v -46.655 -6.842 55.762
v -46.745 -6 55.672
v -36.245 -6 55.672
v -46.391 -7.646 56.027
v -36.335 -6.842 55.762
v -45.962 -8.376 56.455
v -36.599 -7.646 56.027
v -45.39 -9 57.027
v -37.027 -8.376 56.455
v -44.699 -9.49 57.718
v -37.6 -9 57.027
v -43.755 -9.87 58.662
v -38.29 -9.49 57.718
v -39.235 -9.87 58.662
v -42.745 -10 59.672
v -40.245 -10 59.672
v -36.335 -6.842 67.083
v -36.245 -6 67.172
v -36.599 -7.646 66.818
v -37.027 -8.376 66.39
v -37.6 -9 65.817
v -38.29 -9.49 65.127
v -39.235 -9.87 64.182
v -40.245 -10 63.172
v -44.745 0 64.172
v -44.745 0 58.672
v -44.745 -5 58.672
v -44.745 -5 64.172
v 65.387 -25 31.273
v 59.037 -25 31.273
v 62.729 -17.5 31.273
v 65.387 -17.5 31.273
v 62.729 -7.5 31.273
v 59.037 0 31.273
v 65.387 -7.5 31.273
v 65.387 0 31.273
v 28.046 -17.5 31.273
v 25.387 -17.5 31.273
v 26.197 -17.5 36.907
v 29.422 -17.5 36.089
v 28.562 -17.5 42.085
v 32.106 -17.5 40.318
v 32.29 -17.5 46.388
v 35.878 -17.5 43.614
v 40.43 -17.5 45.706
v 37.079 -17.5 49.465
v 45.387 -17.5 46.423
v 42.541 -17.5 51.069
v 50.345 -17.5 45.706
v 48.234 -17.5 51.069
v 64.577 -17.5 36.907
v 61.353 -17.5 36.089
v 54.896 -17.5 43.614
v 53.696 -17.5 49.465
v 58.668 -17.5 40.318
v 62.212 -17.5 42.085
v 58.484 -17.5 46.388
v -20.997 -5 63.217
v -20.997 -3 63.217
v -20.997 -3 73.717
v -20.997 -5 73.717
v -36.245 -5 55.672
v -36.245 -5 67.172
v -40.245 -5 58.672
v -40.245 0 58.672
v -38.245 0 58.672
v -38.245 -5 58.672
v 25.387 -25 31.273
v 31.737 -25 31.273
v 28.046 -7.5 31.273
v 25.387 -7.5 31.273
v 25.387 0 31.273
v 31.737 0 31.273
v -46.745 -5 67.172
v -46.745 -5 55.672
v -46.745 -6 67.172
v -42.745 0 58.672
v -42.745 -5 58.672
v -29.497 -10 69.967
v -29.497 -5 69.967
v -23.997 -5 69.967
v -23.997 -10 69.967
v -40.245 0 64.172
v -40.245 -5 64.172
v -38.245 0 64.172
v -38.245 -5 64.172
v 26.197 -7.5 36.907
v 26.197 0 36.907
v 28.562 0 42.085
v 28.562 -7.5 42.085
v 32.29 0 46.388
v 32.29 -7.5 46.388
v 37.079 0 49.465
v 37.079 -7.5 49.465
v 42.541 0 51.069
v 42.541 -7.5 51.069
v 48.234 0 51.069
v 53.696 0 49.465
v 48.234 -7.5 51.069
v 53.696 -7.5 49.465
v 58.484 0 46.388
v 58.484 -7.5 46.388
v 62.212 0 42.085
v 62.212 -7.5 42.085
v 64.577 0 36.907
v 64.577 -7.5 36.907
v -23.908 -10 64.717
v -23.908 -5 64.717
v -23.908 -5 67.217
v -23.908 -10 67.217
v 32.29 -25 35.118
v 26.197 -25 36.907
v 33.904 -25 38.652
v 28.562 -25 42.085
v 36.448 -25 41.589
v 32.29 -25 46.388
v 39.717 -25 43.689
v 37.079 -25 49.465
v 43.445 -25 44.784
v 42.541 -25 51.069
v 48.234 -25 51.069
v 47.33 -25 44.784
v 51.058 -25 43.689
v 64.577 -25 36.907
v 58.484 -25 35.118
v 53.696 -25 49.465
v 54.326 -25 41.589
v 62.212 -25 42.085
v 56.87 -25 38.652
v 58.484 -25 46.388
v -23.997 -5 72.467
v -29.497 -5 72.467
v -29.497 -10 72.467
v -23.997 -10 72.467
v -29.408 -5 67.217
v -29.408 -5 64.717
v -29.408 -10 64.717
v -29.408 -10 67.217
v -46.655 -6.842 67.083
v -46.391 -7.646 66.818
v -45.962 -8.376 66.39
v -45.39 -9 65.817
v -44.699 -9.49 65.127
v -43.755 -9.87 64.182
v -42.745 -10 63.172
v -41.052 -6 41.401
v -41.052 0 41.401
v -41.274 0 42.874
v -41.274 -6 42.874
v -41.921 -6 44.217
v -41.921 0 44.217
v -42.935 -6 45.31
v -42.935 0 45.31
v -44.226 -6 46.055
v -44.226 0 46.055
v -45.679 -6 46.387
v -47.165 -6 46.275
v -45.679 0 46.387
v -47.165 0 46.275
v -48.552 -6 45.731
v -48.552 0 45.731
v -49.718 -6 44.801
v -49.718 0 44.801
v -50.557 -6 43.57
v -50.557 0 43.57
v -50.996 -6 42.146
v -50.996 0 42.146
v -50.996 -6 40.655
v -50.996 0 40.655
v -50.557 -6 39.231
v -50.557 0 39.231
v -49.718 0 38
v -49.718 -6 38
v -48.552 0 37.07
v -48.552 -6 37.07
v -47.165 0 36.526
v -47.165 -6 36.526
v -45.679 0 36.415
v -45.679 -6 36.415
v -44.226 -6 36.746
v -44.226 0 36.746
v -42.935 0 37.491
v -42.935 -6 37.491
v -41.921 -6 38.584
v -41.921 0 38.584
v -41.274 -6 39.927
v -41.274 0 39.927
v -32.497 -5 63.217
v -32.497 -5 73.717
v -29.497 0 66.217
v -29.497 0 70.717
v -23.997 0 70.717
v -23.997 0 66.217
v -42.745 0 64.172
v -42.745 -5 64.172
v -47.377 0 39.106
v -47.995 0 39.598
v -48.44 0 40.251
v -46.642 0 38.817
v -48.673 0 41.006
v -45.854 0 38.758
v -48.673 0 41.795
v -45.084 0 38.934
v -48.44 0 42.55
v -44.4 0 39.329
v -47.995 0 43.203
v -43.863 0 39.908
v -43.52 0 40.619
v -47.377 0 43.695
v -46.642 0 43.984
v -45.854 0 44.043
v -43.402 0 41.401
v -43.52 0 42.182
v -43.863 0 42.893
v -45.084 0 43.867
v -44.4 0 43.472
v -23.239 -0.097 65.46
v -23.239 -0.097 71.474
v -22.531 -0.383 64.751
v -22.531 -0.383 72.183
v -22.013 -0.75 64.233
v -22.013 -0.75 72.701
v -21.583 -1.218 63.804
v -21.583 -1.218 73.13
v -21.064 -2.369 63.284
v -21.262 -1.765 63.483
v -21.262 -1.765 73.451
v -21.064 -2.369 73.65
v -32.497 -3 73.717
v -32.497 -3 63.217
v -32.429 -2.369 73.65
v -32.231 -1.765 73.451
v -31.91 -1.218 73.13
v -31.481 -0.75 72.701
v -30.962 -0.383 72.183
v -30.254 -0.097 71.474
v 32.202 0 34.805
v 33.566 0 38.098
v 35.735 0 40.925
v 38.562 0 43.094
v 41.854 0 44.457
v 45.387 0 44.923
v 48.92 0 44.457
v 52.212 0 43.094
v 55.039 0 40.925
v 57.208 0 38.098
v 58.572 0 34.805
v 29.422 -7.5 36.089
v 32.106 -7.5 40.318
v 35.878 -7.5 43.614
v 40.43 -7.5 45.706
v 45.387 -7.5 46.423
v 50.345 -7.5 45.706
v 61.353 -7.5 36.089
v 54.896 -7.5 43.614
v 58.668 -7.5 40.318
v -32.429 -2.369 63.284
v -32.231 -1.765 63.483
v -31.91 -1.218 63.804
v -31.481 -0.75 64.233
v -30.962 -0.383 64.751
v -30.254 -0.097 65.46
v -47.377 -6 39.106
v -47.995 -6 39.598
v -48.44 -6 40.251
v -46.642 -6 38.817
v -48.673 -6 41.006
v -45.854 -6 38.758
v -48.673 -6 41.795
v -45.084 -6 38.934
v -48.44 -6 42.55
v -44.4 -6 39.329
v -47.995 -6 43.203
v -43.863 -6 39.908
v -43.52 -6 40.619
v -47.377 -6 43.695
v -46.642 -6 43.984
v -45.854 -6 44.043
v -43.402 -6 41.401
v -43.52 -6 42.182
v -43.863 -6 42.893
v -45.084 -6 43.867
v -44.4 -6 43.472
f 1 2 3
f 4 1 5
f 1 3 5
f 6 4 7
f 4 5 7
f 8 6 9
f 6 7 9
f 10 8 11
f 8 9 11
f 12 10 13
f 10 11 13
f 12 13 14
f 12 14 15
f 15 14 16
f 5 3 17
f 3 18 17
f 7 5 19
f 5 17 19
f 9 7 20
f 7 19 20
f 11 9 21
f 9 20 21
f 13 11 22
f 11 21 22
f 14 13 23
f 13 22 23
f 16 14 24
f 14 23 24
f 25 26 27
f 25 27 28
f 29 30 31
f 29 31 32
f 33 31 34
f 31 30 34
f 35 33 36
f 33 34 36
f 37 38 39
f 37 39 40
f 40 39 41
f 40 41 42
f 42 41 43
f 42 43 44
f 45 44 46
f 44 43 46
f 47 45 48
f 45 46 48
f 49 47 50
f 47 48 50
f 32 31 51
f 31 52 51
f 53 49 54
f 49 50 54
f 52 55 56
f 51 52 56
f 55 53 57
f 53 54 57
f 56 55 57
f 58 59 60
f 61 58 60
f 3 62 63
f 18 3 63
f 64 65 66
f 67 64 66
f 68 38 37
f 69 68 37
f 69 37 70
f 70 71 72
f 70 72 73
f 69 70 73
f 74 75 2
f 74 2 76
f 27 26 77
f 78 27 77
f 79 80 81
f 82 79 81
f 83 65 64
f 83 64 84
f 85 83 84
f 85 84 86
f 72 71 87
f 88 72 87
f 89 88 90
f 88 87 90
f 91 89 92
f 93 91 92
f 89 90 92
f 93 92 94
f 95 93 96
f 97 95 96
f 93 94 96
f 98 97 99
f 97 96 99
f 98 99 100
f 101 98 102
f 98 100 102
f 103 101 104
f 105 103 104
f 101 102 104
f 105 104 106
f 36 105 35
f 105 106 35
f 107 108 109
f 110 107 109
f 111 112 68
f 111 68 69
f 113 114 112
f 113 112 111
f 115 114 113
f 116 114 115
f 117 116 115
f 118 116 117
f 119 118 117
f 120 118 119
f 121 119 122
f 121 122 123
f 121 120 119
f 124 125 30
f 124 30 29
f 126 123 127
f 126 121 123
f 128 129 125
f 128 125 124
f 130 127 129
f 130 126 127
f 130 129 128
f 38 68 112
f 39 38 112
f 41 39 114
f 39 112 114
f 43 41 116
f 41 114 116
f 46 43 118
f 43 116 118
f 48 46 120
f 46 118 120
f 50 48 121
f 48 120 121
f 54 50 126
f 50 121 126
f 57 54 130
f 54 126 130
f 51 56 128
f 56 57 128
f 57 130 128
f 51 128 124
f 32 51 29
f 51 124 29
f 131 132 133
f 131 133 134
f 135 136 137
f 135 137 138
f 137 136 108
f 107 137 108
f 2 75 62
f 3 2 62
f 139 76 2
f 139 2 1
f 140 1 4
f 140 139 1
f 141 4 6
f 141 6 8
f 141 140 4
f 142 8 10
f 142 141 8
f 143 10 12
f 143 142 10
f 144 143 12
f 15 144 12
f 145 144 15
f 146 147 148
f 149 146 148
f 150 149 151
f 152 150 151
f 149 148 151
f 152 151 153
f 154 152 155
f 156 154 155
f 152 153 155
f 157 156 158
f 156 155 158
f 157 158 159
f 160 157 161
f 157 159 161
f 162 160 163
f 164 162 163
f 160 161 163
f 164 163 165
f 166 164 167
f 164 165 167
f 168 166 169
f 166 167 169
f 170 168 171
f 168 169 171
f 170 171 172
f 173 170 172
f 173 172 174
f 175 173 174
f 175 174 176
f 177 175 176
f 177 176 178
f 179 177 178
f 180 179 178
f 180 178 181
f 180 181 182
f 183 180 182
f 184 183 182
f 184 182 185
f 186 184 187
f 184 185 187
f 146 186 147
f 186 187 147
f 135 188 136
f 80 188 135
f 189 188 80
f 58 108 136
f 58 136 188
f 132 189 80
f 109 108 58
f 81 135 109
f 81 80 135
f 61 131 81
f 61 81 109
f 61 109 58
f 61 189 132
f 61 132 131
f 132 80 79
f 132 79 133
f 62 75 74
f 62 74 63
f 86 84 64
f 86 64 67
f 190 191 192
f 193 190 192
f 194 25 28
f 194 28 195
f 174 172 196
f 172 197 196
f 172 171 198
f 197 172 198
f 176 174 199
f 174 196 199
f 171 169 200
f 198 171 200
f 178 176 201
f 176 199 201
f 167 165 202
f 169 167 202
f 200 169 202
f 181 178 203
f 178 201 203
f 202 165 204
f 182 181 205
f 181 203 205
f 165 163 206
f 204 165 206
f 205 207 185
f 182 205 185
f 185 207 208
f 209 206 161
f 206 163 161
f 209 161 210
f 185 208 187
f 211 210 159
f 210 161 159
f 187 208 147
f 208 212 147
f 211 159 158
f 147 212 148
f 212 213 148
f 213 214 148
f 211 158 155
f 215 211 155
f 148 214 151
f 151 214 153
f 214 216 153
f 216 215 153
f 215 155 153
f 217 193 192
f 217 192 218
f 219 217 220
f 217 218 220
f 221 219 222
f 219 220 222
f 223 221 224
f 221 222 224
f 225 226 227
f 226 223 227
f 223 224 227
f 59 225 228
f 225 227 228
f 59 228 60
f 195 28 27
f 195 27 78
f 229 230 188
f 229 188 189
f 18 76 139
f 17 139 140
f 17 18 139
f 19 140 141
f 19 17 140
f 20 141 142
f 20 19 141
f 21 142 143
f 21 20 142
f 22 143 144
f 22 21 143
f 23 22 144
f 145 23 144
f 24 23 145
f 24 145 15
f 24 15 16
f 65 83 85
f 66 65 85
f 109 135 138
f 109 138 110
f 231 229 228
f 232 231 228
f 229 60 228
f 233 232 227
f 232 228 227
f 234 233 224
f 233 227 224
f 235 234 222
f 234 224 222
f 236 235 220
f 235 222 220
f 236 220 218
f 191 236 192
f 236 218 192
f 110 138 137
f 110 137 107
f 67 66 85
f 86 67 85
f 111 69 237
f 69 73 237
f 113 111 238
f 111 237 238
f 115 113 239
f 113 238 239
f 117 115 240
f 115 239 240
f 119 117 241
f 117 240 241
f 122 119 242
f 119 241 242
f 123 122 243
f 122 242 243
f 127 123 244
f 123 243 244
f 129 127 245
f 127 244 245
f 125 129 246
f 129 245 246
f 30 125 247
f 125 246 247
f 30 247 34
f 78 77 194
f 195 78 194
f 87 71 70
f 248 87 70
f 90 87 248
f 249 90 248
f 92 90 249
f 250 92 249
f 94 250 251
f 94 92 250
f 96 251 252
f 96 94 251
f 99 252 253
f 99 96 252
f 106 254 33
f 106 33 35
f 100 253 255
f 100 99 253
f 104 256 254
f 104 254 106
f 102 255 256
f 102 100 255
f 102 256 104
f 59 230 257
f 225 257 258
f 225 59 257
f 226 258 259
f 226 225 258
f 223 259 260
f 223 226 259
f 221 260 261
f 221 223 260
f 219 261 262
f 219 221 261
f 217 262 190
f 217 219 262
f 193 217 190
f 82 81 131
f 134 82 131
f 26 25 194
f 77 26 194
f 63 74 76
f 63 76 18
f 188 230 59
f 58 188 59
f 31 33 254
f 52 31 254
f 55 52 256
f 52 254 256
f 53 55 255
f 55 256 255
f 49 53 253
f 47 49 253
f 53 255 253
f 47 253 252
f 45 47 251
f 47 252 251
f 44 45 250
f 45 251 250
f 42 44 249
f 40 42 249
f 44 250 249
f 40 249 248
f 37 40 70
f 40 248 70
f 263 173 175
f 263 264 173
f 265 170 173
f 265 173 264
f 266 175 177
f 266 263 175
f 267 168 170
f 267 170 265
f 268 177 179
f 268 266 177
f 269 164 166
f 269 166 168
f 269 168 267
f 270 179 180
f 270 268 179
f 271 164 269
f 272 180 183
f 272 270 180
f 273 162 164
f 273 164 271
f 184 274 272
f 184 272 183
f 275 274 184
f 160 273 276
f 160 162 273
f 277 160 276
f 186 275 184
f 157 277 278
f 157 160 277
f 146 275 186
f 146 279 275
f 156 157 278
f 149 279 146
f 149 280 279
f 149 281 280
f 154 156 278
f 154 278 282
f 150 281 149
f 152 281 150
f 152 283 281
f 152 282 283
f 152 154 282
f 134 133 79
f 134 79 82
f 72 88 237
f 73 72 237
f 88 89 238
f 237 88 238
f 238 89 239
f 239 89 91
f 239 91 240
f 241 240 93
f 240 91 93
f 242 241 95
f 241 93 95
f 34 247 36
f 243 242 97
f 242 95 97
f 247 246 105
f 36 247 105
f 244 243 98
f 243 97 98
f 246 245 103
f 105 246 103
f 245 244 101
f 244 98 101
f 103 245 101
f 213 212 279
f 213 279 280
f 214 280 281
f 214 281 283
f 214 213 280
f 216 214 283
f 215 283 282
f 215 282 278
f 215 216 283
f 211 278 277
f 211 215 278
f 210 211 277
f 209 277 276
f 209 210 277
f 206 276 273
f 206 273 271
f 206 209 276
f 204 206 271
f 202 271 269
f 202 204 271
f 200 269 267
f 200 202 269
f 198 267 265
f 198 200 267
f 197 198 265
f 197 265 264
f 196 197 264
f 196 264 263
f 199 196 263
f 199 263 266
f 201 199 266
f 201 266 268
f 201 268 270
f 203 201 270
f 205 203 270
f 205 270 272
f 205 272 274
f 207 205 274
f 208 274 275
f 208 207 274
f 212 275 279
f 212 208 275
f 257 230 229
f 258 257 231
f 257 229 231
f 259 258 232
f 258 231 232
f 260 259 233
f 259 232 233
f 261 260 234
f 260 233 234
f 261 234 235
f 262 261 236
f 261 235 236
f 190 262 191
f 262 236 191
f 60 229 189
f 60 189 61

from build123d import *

# Parameters (mm, degrees)
F0_R      = 5
F0_R_2    = 2.65
F1_DEPTH  = 6
F2_W      = 2
F2_H      = 5.5
F3_DEPTH  = 5
F4_W      = 10.5
F4_H      = 11.5
F5_DEPTH  = 5
F6_R      = 4
F7_W      = 11.5
F7_H      = 10.5
F8_DEPTH  = 5
F9_W      = 5.5
F9_H      = 2.5
F10_DEPTH = 5
F11_R     = 3
F13_DEPTH = 7.5
F15_DEPTH = 10
F17_DEPTH = 7.5
F19_DEPTH = 25


with BuildPart() as f1:
    # F0 (on Front) → F1 (new body)
    with BuildSketch(Plane.XZ):
        with Locations((-46.0522696376, 41.4005257189)):
            Circle(F0_R)
        with Locations((-46.0522696376, 41.4005257189)):
            Circle(F0_R_2, mode=Mode.SUBTRACT)
    extrude(amount=F1_DEPTH)


with BuildPart() as f3:
    # F2 (on Front) → F3 (new body)
    with BuildSketch(Plane.XZ):
        with Locations((-39.2449274361, 61.4222493172)):
            Rectangle(F2_W, F2_H)
    extrude(amount=F3_DEPTH)


with BuildPart() as f3b:
    # F2 (on Front) → F3, piece 2 (new body)
    with BuildSketch(Plane.XZ):
        with Locations((-43.7449274361, 61.4222493172)):
            Rectangle(F2_W, F2_H)
    extrude(amount=F3_DEPTH)


with BuildPart() as f5:
    # F4 (on face) → F5 (new body)
    with BuildSketch(Plane.XZ.offset(5)):
        with Locations((-41.4949274361, 61.4222493172)):
            Rectangle(F4_W, F4_H)
    extrude(amount=F5_DEPTH)

    # F6
    f6_edges = [f5.edges().sort_by_distance(p)[0] for p in [
        (-41.494927, -10, 67.172249),
        (-46.744927, -10, 61.422249),
        (-41.494927, -10, 55.672249),
        (-36.244927, -10, 61.422249),
    ]]
    fillet(f6_edges, radius=F6_R)


with BuildPart() as f8:
    # F7 (on Front) → F8 (new body)
    with BuildSketch(Plane.XZ):
        with Locations((-26.7465799004, 68.466984272)):
            Rectangle(F7_W, F7_H)
    extrude(amount=F8_DEPTH)

    # F9 (on face) → F10 (join)
    with BuildSketch(Plane.XZ.offset(5)):
        with Locations((-26.7465799004, 71.216984272)):
            Rectangle(F9_W, F9_H)
        with Locations((-26.6575082093, 65.966984272)):
            Rectangle(F9_W, F9_H)
    extrude(amount=F10_DEPTH)

    # F11
    f11_edges = [f8.edges().sort_by_distance(p)[0] for p in [
        (-26.74658, 0, 73.716984),
        (-32.49658, 0, 68.466984),
        (-26.74658, 0, 63.216984),
        (-20.99658, 0, 68.466984),
    ]]
    fillet(f11_edges, radius=F11_R)


with BuildPart() as f13:
    # F12 (on Front) → F13 (new body)
    with BuildSketch(Plane.XZ):
        with BuildLine():
            ThreePointArc((45.3872331232, 51.2725864351), (59.5293687469, 45.4147220588), (65.3872331232, 31.2725864351))
            Line((65.3872331232, 31.2725864351), (65.3872331232, 51.2725864351))
            Line((65.3872331232, 51.2725864351), (45.3872331232, 51.2725864351))
        make_face()
        with BuildLine():
            ThreePointArc((25.3872331232, 31.2725864351), (31.2450974995, 45.4147220588), (45.3872331232, 51.2725864351))
            Line((45.3872331232, 51.2725864351), (25.3872331232, 51.2725864351))
            Line((25.3872331232, 51.2725864351), (25.3872331232, 31.2725864351))
        make_face()
        with BuildLine():
            ThreePointArc((31.7372331232, 31.2725864351), (35.73522556, 40.9245939983), (45.3872331232, 44.9225864351))
            Line((45.3872331232, 44.9225864351), (45.3872331232, 51.2725864351))
            ThreePointArc((45.3872331232, 51.2725864351), (31.2450974995, 45.4147220588), (25.3872331232, 31.2725864351))
            Line((25.3872331232, 31.2725864351), (31.7372331232, 31.2725864351))
        make_face()
        with BuildLine():
            ThreePointArc((45.3872331232, 44.9225864351), (55.0392406864, 40.9245939983), (59.0372331232, 31.2725864351))
            Line((59.0372331232, 31.2725864351), (65.3872331232, 31.2725864351))
            ThreePointArc((65.3872331232, 31.2725864351), (59.5293687469, 45.4147220588), (45.3872331232, 51.2725864351))
            Line((45.3872331232, 51.2725864351), (45.3872331232, 44.9225864351))
        make_face()
    extrude(amount=F13_DEPTH)

    # F14 (on face) → F15 (join)
    with BuildSketch(Plane.XZ.offset(7.5)):
        with BuildLine():
            ThreePointArc((31.7372331232, 31.2725864351), (35.73522556, 40.9245939983), (45.3872331232, 44.9225864351))
            ThreePointArc((45.3872331232, 44.9225864351), (55.0392406864, 40.9245939983), (59.0372331232, 31.2725864351))
            Line((59.0372331232, 31.2725864351), (62.7287295984, 31.2725864351))
            ThreePointArc((62.7287295984, 31.2725864351), (45.3872331232, 46.4225864351), (28.045736648, 31.2725864351))
            Line((28.045736648, 31.2725864351), (31.7372331232, 31.2725864351))
        make_face()
    extrude(amount=F15_DEPTH)

    # F16 (on face) → F17 (join)
    with BuildSketch(Plane.XZ.offset(17.5)):
        with BuildLine():
            Line((25.3872331232, 51.2790717185), (25.3872331232, 31.2725864351))
            Line((25.3872331232, 31.2725864351), (28.045736648, 31.2725864351))
            ThreePointArc((28.045736648, 31.2725864351), (45.3872331232, 46.4225864351), (62.7287295984, 31.2725864351))
            Line((62.7287295984, 31.2725864351), (65.3872331232, 31.2725864351))
            Line((65.3872331232, 31.2725864351), (65.3872331232, 51.2790717185))
            Line((65.3872331232, 51.2790717185), (25.3872331232, 51.2790717185))
        make_face()
        with BuildLine():
            ThreePointArc((62.7287295984, 31.2725864351), (45.3872331232, 46.4225864351), (28.045736648, 31.2725864351))
            Line((28.045736648, 31.2725864351), (31.7372331232, 31.2725864351))
            ThreePointArc((31.7372331232, 31.2725864351), (45.3872331232, 44.9225864351), (59.0372331232, 31.2725864351))
            Line((59.0372331232, 31.2725864351), (62.7287295984, 31.2725864351))
        make_face()
    extrude(amount=F17_DEPTH)

    # F18 (on face) → F19 (cut)
    with BuildSketch(Plane.XZ.offset(25)):
        with BuildLine():
            ThreePointArc((25.3872331232, 31.2725864351), (45.3872331232, 51.2725864351), (65.3872331232, 31.2725864351))
            Line((65.3872331232, 31.2725864351), (65.3872331232, 51.2790717185))
            Line((65.3872331232, 51.2790717185), (25.3872331232, 51.2790717185))
            Line((25.3872331232, 51.2790717185), (25.3872331232, 31.2725864351))
        make_face()
    extrude(amount=-F19_DEPTH, mode=Mode.SUBTRACT)


solid = Compound([f1.part, f3.part, f3b.part, f5.part, f8.part, f13.part])
